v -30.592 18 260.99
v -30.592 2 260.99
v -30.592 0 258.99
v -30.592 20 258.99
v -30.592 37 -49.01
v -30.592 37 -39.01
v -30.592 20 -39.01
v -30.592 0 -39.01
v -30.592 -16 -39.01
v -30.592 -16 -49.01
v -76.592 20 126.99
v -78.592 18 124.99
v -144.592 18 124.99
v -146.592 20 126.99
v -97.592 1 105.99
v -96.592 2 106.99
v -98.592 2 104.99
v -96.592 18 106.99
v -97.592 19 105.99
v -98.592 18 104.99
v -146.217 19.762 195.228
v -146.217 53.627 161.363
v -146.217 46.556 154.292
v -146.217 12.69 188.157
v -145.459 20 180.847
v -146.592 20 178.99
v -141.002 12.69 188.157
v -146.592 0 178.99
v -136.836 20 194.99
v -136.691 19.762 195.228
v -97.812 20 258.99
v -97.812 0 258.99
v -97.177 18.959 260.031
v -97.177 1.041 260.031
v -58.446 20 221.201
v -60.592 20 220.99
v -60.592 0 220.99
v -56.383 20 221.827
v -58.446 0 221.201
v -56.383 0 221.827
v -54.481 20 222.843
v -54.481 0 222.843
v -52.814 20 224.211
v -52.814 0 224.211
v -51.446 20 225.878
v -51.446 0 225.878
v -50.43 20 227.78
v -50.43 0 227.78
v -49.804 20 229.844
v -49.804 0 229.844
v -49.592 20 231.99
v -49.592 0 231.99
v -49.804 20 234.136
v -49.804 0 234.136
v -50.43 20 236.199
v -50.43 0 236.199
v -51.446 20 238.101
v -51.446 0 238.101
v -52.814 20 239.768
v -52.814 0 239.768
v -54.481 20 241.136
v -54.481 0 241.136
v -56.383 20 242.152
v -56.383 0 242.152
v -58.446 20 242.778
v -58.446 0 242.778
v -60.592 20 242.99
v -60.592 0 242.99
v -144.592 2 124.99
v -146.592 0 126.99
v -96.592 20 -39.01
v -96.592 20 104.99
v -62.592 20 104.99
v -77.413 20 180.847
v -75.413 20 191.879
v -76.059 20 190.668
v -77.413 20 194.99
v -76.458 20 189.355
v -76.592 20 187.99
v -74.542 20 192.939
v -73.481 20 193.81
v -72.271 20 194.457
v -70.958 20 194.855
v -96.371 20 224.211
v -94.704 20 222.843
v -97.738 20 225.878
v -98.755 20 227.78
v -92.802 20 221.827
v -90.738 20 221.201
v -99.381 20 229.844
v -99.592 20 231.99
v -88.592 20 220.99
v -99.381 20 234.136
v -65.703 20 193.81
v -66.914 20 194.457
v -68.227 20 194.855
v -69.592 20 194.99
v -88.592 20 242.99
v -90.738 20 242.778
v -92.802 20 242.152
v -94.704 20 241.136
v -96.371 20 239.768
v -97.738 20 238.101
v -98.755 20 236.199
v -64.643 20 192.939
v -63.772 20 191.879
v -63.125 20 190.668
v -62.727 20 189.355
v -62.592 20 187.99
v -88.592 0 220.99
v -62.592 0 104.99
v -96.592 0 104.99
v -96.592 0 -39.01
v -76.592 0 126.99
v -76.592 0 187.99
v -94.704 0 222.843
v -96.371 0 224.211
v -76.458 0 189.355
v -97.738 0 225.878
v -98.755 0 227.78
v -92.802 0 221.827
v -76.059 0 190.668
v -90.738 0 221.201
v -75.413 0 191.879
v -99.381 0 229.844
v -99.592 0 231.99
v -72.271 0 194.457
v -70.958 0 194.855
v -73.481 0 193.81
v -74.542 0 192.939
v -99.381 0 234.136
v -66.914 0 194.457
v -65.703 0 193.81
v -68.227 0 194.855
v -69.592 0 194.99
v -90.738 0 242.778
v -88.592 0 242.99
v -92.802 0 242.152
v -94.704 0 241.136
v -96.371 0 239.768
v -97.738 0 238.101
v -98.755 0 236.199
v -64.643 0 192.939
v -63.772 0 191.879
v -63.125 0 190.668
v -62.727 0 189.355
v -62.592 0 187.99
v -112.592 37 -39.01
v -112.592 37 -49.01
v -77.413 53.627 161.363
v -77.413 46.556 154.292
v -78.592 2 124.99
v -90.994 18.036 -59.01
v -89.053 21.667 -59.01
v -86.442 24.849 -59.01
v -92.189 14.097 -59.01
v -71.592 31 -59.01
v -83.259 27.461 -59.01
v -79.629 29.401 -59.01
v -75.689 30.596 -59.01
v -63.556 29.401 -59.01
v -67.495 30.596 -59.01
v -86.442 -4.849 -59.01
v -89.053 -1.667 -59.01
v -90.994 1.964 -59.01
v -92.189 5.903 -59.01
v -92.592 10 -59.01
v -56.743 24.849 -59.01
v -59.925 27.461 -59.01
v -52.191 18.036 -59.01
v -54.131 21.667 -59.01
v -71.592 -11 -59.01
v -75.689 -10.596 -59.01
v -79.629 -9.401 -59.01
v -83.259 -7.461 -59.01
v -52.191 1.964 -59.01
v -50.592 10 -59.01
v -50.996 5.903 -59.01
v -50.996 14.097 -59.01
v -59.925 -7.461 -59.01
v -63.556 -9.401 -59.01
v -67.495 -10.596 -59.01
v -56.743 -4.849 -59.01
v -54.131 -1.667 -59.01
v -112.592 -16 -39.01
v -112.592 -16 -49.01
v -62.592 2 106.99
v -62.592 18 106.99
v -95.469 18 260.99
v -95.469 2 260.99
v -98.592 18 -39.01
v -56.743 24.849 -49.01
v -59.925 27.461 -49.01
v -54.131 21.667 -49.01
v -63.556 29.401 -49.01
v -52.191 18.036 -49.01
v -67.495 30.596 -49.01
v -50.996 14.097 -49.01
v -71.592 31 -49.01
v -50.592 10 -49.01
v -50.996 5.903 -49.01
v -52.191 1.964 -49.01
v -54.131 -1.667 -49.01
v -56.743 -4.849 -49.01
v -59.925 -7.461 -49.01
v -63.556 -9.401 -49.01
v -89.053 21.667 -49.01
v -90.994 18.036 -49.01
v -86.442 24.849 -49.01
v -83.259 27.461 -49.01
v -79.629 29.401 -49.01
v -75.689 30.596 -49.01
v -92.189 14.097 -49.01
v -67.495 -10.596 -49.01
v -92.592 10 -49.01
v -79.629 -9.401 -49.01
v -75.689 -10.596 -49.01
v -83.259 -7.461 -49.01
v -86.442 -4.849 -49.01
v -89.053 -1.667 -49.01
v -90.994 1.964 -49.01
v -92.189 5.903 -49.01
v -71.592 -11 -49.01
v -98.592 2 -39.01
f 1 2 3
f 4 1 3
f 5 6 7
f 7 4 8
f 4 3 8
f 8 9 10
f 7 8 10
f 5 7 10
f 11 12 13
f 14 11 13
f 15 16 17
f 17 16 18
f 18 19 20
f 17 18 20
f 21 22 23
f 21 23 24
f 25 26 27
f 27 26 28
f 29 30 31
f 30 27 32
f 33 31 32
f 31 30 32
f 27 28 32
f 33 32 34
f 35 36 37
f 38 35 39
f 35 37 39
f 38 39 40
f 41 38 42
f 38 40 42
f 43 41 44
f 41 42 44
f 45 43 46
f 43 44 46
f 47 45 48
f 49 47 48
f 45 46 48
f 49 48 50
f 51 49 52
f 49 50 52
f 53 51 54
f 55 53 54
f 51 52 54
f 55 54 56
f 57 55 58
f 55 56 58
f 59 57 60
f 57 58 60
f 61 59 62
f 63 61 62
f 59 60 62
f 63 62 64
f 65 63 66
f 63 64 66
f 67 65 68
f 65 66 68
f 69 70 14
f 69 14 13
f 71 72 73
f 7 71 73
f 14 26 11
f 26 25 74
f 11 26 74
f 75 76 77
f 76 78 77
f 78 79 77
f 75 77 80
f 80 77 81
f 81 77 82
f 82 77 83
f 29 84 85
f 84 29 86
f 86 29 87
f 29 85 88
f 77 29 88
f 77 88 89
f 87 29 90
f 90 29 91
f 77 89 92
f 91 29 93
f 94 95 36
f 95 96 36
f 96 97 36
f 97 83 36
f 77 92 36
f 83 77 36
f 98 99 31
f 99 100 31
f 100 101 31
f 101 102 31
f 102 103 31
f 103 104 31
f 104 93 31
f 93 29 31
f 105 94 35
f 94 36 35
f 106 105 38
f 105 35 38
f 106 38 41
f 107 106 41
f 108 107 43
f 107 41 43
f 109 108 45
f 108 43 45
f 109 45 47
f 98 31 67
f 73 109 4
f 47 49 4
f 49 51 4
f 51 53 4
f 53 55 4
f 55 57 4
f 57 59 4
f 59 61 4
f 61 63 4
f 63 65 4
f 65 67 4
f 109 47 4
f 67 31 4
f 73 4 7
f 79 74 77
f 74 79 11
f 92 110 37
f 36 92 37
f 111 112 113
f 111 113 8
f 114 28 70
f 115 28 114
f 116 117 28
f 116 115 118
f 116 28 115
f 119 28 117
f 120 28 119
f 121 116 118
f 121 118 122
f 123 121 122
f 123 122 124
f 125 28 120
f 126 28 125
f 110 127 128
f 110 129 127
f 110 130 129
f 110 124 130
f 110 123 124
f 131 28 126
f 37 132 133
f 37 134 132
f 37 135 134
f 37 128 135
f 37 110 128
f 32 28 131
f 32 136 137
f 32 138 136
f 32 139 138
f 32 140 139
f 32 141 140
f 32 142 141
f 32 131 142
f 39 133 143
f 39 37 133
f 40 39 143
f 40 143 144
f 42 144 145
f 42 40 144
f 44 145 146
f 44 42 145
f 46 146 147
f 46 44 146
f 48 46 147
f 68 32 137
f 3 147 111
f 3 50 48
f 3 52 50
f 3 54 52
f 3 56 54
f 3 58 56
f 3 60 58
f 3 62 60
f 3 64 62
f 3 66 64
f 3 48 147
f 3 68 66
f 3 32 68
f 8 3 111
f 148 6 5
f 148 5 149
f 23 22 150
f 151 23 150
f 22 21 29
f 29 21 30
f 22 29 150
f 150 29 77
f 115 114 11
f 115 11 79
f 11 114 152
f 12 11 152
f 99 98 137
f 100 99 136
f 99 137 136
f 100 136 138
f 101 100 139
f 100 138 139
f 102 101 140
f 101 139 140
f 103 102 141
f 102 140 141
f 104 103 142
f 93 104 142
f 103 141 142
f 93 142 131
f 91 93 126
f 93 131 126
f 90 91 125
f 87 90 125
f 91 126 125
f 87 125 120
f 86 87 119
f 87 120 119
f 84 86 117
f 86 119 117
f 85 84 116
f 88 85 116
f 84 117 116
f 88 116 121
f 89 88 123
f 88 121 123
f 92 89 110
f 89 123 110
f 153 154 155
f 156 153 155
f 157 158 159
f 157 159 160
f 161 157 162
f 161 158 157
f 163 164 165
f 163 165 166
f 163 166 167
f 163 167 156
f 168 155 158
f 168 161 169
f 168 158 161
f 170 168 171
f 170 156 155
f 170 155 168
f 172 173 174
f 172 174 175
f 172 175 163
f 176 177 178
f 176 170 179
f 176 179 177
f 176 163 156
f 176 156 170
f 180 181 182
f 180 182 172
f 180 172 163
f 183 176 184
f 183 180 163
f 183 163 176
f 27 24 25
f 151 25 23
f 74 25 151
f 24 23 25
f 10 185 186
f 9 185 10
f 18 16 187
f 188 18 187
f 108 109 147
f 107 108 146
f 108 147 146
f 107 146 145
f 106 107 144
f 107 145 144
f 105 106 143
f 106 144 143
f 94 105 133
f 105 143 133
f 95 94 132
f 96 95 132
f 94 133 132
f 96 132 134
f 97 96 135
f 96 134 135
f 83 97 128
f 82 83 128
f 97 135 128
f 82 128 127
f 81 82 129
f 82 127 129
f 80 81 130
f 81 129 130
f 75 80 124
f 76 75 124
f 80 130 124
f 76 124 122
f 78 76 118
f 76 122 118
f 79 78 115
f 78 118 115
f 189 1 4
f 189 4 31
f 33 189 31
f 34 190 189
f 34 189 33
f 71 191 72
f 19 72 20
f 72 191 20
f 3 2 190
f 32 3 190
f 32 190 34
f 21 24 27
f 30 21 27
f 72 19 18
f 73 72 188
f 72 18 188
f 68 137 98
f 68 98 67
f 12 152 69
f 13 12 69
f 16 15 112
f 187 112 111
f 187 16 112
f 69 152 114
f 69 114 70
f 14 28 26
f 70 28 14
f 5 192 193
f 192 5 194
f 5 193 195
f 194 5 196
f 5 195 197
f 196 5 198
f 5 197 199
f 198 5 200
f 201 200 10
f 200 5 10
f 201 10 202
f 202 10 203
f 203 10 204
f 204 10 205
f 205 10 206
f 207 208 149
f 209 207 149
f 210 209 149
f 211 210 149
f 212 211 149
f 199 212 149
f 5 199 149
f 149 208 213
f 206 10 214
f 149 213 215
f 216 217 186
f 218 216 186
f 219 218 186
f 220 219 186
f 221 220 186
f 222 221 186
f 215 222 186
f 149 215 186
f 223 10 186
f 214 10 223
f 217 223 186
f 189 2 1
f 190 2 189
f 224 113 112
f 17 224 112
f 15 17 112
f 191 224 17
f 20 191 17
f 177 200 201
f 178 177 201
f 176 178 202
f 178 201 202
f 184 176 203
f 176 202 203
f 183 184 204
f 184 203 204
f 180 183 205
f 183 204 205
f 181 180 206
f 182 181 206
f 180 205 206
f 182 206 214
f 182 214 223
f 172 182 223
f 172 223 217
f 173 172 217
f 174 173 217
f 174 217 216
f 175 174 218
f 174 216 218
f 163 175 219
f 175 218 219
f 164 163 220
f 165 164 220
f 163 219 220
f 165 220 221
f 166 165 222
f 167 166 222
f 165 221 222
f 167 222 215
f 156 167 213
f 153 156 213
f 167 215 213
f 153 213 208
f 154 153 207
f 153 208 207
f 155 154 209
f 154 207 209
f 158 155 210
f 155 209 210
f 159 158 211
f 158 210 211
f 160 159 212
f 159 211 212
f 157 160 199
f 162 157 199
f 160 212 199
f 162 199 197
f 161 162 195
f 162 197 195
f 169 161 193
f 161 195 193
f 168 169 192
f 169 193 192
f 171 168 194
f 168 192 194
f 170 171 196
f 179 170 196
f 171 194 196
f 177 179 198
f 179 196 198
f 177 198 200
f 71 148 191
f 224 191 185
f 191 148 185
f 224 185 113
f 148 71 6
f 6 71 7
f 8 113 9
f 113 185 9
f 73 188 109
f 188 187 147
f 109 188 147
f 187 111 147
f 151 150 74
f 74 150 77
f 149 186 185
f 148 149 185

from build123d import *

# Parameters (mm, degrees)
F1_DEPTH     = 20
F2_W         = 14
F2_H         = 63
F3_DEPTH     = 25
F4_W         = 28
F4_H         = 22
F5_DEPTH     = 25
F7_DEPTH     = 16
F10_DEPTH    = 17
F9_R         = 21
F11_DEPTH    = 10
F13_SIZE     = 2
F14_T1_DEPTH = 30.2867319519
F14_T3_DEPTH = 26.2867319519
F14_T5_DEPTH = 25.9668324626
F15_SIZE     = 2
F18_W        = 68.8039958477
F18_H        = 47.8929802775
F19_DEPTH    = 10


# Not quite as in the source:
# - a fillet or chamfer that OpenCascade refuses, or shapes differently, is made with other operations: its cross-section is extruded or revolved along the edge and cut away or added


with BuildPart() as f1:
    # F0 (on Front) → F1 (new body)
    with BuildSketch(Plane.XZ):
        Polygon((-30.5923320651, 260.9896056354), (-146.5923320651, 260.9896056354), (-146.5923320651, -39.0103943646), (-112.5923320651, -39.0103943646), (-30.5923320651, -39.0103943646), align=None)
        Polygon((-30.5923320651, -49.0103943646), (-30.5923320651, -39.0103943646), (-112.5923320651, -39.0103943646), (-112.5923320651, -49.0103943646), (-92.5923320651, -49.0103943646), (-50.5923320651, -49.0103943646), align=None)
    extrude(amount=-F1_DEPTH)

    # F2 (on face) → F3 (cut)
    with BuildSketch(Plane.XZ):
        Polygon((-158.5923320651, 124.9896056354), (-158.5923320651, -39.0103943646), (-98.5923320651, -39.0103943646), (-98.5923320651, 106.9896056354), (-98.5923320651, 124.9896056354), align=None)
        Polygon((-98.5923320651, 124.9896056354), (-98.5923320651, 106.9896056354), (-62.5923320651, 106.9896056354), (-62.5923320651, 124.9896056354), (-76.5923320651, 124.9896056354), align=None)
        with Locations((-69.5923320651, 156.4896056354)):
            Rectangle(F2_W, F2_H)
        with BuildLine():
            ThreePointArc((-62.5923320651, 187.9896056354), (-69.5923320651, 194.9896056354), (-76.5923320651, 187.9896056354))
            Line((-76.5923320651, 187.9896056354), (-62.5923320651, 187.9896056354))
        make_face()
        Polygon((-146.5923320651, 260.9896056354), (-146.5923320651, 178.9896056354), (-96.5923320651, 260.9896056354), align=None)
    extrude(amount=-F3_DEPTH, mode=Mode.SUBTRACT)

    # F4 (on face) → F5 (cut)
    with BuildSketch(Plane.XZ):
        with Locations((-74.5923320651, 231.9896056354)):
            Rectangle(F4_W, F4_H)
        with BuildLine():
            ThreePointArc((-60.5923320651, 220.9896056354), (-49.5923320651, 231.9896056354), (-60.5923320651, 242.9896056354))
            Line((-60.5923320651, 242.9896056354), (-60.5923320651, 220.9896056354))
        make_face()
        with BuildLine():
            Line((-88.5923320651, 220.9896056354), (-88.5923320651, 242.9896056354))
            ThreePointArc((-88.5923320651, 242.9896056354), (-99.5923320651, 231.9896056354), (-88.5923320651, 220.9896056354))
        make_face()
    extrude(amount=-F5_DEPTH, mode=Mode.SUBTRACT)

    # F6 (on face) → F7 (join)
    with BuildSketch(Plane.XZ):
        Polygon((-30.5923320651, -39.0103943646), (-98.5923320651, -39.0103943646), (-112.5923320651, -39.0103943646), (-112.5923320651, -49.0103943646), (-30.5923320651, -49.0103943646), align=None)
    extrude(amount=F7_DEPTH)

    # F8 (on face) → F10 (join)
    with BuildSketch(Plane(origin=(0, 20, 0), x_dir=(-1, 0, 0), z_dir=(0, 1, 0))):
        Polygon((112.5923320651, -39.0103943646), (98.5923320651, -39.0103943646), (30.5923320651, -39.0103943646), (30.5923320651, -49.0103943646), (112.5923320651, -49.0103943646), align=None)
    extrude(amount=F10_DEPTH)

    # F9 (on face) → F11 (join)
    with BuildSketch(Plane(origin=(0, 0, -49.0103943646), x_dir=(1, 0, 0), z_dir=(0, 0, -1))):
        with Locations((-71.5923320651, -10)):
            Circle(F9_R)
    extrude(amount=F11_DEPTH)

    # F13
    f13_edges = [f1.edges().sort_by_distance(p)[0] for p in [
        (-98.592332, 0, 33.989606),
        (-98.592332, 20, 33.989606),
    ]]
    chamfer(f13_edges, length=F13_SIZE)

    # F14: chamfer of 2 on 4 edges, made by hand

    # F14_s2 → F14_t1 (cut)
    with BuildSketch(Plane.XZ.offset(-25.1433659759)):
        Polygon((-146.5923320651, 126.9896056354), (-144.5923320651, 124.9896056354), (-146.5923320651, 124.9896056354), align=None)
        Polygon((-76.5923320651, 126.9896056354), (-78.5923320651, 124.9896056354), (-76.5923320651, 124.9896056354), align=None)
    extrude(amount=F14_T1_DEPTH, mode=Mode.SUBTRACT)

    # F14_s4 → F14_t3 (cut)
    with BuildSketch(Plane.XZ.offset(-23.1433659759)):
        Polygon((-96.5923320651, 106.9896056354), (-98.5923320651, 104.9896056354), (-98.5923320651, 106.9896056354), align=None)
    extrude(amount=F14_T3_DEPTH, mode=Mode.SUBTRACT)

    # F14_s6 → F14_t5 (cut)
    with BuildSketch(Plane.XZ.offset(-22.9834162313)):
        Polygon((-95.4693648059, 260.9896056354), (-97.1769571575, 260.0308204839), (-96.5923320651, 260.9896056354), align=None)
    extrude(amount=F14_T5_DEPTH, mode=Mode.SUBTRACT)

    # F15
    f15_edges = [f1.edges().sort_by_distance(p)[0] for p in [
        (-111.592332, 0, 124.989606),
        (-111.592332, 20, 124.989606),
        (-79.592332, 0, 106.989606),
        (-79.592332, 20, 106.989606),
        (-63.030848, 0, 260.989606),
        (-63.030848, 20, 260.989606),
    ]]
    chamfer(f15_edges, length=F15_SIZE)

    # F18 (on face) → F19 (join)
    with BuildSketch(Plane(origin=(0, 107.4948028177, 107.4948028177), x_dir=(1, 0, 0), z_dir=(0, -0.7071067812, -0.7071067812))):
        with Locations((-111.8147820234, 100.1271270216)):
            Rectangle(F18_W, F18_H)
    extrude(amount=F19_DEPTH)


solid = f1.part
